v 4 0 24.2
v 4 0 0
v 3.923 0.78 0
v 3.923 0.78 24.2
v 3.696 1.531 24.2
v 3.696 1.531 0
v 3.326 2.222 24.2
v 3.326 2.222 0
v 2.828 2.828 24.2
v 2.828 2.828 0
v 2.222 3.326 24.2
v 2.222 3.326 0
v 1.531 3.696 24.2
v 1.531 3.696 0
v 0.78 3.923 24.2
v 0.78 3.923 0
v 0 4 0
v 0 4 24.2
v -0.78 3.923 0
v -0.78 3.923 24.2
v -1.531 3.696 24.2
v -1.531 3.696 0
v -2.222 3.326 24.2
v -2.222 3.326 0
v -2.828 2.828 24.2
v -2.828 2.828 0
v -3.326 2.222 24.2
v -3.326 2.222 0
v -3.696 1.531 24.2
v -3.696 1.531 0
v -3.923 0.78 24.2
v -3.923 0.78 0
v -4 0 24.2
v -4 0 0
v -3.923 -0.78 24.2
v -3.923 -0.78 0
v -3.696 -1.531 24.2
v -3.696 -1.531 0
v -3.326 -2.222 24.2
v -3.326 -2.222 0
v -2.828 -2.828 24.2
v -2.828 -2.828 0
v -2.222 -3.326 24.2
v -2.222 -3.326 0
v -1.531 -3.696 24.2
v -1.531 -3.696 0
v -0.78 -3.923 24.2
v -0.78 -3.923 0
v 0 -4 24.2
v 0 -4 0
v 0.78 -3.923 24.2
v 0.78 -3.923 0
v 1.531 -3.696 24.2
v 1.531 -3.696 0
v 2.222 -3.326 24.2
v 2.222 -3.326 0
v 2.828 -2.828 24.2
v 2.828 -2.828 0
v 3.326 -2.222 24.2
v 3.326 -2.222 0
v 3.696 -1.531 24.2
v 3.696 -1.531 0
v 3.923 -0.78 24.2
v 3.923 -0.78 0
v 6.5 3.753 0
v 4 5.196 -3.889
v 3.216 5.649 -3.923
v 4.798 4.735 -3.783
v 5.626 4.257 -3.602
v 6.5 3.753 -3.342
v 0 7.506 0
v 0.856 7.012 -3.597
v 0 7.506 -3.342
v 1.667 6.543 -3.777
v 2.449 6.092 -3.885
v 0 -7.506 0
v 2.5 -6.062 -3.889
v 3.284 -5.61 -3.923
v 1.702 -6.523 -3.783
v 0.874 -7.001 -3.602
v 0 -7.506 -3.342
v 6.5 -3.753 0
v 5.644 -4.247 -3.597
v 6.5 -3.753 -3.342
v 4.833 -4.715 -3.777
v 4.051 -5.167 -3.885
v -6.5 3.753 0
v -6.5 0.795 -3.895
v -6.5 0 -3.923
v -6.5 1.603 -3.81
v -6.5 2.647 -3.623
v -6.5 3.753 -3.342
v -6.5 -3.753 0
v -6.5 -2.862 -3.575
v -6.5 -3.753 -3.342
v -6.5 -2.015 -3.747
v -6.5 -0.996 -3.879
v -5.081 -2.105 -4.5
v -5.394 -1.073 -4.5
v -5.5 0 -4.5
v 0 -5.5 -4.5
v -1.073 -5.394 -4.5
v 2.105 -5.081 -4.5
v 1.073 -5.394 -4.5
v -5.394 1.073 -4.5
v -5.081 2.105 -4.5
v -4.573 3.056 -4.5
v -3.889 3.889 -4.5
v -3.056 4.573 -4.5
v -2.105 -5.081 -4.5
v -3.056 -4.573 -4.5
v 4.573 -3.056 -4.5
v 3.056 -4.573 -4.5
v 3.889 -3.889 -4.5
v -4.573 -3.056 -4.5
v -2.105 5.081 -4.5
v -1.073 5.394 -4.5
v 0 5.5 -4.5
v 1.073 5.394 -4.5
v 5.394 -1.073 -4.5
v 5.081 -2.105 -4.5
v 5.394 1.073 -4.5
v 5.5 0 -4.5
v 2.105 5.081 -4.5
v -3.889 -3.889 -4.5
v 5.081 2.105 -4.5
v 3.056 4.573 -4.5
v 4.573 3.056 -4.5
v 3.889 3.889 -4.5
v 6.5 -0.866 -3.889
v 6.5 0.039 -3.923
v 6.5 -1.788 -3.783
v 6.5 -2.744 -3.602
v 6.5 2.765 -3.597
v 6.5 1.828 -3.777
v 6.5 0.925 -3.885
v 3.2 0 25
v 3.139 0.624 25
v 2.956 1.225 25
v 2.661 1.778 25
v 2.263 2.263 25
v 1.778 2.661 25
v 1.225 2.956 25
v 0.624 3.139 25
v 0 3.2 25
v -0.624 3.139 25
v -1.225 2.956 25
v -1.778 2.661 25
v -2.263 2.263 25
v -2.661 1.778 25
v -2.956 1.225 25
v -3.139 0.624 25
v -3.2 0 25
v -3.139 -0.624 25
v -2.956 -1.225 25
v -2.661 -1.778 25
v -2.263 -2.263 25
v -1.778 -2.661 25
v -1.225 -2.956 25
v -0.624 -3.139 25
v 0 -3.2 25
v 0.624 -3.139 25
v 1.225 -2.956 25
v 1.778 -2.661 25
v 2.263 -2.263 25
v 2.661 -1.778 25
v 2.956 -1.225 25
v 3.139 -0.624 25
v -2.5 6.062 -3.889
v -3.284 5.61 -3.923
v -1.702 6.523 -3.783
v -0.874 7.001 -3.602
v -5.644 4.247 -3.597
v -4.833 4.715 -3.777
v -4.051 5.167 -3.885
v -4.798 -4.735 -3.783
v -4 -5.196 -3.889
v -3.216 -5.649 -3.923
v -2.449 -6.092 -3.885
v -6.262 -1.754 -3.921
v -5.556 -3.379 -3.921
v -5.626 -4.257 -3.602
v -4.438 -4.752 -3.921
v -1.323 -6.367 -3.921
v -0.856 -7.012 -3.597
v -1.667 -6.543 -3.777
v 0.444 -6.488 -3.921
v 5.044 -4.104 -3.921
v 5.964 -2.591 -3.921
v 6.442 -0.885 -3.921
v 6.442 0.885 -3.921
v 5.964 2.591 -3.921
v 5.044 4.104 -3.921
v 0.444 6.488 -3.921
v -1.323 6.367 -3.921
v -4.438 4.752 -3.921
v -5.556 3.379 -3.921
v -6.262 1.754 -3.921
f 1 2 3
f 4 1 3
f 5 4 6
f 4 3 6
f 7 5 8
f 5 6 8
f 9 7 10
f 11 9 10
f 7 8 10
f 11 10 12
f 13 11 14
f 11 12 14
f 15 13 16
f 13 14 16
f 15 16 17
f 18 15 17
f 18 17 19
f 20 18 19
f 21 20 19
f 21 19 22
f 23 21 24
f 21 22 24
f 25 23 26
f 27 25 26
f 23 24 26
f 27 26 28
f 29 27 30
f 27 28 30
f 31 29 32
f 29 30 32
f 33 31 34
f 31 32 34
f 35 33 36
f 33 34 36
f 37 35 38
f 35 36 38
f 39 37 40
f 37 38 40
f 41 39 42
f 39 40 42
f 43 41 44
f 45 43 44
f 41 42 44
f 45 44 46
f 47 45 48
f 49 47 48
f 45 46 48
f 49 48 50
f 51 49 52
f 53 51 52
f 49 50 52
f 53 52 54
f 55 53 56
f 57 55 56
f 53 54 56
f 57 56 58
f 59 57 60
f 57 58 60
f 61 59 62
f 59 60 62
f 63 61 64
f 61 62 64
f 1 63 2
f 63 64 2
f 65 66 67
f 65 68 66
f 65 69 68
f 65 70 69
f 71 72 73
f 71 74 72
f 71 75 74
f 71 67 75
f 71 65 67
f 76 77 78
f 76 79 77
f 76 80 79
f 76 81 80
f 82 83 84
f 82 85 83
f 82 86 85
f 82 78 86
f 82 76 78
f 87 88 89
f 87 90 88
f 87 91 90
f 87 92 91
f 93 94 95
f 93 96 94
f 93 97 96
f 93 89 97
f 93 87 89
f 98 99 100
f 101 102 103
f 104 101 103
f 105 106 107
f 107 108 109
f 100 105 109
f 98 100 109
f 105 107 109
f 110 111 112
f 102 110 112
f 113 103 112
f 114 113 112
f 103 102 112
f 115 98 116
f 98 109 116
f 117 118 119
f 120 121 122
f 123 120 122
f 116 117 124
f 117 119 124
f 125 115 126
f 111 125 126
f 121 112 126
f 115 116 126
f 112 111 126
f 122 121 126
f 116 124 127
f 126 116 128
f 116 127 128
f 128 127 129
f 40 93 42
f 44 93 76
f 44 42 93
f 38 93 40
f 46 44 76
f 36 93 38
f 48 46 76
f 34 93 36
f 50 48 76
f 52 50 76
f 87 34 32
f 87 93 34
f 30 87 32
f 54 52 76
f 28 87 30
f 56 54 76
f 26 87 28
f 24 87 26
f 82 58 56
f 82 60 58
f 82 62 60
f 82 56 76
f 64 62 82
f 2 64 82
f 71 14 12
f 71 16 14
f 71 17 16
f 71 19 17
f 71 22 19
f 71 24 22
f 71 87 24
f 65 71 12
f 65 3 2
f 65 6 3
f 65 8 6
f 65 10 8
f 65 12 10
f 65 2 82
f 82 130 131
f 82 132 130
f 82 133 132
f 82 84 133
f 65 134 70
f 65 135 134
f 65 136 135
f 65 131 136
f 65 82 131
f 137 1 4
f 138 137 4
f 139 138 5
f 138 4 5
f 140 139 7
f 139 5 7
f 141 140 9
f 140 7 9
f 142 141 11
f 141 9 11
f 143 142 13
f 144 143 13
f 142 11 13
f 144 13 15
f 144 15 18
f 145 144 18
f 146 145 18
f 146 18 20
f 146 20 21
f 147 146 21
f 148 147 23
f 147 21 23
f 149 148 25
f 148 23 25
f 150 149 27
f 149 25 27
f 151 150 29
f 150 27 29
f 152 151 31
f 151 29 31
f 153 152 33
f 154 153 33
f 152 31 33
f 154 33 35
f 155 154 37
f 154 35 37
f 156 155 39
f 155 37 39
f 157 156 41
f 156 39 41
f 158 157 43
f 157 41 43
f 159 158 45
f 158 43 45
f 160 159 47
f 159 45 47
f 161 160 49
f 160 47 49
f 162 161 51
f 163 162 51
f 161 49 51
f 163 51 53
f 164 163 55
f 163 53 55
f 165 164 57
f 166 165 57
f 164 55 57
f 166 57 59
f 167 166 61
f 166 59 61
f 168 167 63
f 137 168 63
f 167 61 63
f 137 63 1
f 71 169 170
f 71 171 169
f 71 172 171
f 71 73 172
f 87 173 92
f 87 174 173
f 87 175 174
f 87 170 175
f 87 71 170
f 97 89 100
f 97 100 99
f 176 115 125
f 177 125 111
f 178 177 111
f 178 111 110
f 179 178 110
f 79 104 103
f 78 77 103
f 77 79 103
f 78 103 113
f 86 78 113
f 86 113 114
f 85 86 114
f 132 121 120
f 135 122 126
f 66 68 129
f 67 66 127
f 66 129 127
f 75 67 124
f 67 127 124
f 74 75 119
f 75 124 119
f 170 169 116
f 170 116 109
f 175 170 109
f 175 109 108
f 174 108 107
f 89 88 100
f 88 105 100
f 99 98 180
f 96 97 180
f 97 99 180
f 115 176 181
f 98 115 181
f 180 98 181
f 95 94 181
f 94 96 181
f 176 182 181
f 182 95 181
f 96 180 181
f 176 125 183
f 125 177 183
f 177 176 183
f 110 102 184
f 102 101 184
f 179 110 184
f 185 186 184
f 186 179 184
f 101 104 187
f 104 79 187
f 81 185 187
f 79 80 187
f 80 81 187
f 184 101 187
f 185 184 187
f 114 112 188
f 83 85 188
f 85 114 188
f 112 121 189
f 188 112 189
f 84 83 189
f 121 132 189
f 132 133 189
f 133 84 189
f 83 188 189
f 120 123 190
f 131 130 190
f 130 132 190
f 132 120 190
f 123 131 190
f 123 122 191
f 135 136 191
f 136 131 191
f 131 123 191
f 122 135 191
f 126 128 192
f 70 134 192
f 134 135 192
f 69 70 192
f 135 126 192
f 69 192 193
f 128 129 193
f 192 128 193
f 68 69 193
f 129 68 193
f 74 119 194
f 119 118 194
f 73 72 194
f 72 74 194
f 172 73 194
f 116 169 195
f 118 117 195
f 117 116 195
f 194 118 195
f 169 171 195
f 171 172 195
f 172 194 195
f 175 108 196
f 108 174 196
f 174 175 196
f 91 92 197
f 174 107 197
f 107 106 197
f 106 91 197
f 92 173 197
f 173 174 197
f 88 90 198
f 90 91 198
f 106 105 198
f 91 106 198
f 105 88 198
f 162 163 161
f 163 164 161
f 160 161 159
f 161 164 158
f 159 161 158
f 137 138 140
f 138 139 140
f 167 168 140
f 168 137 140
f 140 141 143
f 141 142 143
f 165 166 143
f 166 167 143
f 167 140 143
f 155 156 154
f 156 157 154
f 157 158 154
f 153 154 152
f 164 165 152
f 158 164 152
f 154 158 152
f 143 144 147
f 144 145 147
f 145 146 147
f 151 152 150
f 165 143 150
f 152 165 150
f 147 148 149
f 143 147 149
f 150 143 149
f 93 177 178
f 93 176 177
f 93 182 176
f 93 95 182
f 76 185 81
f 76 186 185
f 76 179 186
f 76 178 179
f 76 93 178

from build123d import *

# Parameters (mm, degrees)
ESQUISSE1_W        = 4
ESQUISSE1_H        = 25
CHANFREIN1_SIZE    = 0.8
BOSS_EXTRU_1_DEPTH = 4.5


with BuildPart() as part:
    # Esquisse1 → Base-Révolution (revolve)
    with BuildSketch(Plane(origin=(0, 0, 0), x_dir=(1, 0, 0), z_dir=(0, 1, 0))):
        with Locations((2, -12.5)):
            Rectangle(ESQUISSE1_W, ESQUISSE1_H)
    revolve(axis=Axis((0, 0, 0), (0, 0, 1)))

    # Chanfrein1
    chanfrein1_edges = [part.edges().sort_by_distance(p)[0] for p in [
        (-4, 0, 25),
    ]]
    chamfer(chanfrein1_edges, length=CHANFREIN1_SIZE)

    # Esquisse6 → Boss.-Extru.1 (add)
    with BuildSketch(Plane.XY):
        Polygon((6.5, -3.75277675), (6.5, 3.75277675), (0, 7.505553499), (-6.5, 3.75277675), (-6.5, -3.75277675), (0, -7.505553499), align=None)
    extrude(amount=-BOSS_EXTRU_1_DEPTH)

    # Esquisse7 → Enlèvement de matière-Révolution1 (revolve, cut)
    with BuildSketch(Plane(origin=(0, 0, 0), x_dir=(1, 0, 0), z_dir=(0, 1, 0))):
        Polygon((-5.5, 4.5), (-13.294228634, 4.5), (-13.294228634, 0), align=None)
    revolve(axis=Axis((0, 0, -6.239446496), (0, 0, 1)), mode=Mode.SUBTRACT)


solid = part.part
